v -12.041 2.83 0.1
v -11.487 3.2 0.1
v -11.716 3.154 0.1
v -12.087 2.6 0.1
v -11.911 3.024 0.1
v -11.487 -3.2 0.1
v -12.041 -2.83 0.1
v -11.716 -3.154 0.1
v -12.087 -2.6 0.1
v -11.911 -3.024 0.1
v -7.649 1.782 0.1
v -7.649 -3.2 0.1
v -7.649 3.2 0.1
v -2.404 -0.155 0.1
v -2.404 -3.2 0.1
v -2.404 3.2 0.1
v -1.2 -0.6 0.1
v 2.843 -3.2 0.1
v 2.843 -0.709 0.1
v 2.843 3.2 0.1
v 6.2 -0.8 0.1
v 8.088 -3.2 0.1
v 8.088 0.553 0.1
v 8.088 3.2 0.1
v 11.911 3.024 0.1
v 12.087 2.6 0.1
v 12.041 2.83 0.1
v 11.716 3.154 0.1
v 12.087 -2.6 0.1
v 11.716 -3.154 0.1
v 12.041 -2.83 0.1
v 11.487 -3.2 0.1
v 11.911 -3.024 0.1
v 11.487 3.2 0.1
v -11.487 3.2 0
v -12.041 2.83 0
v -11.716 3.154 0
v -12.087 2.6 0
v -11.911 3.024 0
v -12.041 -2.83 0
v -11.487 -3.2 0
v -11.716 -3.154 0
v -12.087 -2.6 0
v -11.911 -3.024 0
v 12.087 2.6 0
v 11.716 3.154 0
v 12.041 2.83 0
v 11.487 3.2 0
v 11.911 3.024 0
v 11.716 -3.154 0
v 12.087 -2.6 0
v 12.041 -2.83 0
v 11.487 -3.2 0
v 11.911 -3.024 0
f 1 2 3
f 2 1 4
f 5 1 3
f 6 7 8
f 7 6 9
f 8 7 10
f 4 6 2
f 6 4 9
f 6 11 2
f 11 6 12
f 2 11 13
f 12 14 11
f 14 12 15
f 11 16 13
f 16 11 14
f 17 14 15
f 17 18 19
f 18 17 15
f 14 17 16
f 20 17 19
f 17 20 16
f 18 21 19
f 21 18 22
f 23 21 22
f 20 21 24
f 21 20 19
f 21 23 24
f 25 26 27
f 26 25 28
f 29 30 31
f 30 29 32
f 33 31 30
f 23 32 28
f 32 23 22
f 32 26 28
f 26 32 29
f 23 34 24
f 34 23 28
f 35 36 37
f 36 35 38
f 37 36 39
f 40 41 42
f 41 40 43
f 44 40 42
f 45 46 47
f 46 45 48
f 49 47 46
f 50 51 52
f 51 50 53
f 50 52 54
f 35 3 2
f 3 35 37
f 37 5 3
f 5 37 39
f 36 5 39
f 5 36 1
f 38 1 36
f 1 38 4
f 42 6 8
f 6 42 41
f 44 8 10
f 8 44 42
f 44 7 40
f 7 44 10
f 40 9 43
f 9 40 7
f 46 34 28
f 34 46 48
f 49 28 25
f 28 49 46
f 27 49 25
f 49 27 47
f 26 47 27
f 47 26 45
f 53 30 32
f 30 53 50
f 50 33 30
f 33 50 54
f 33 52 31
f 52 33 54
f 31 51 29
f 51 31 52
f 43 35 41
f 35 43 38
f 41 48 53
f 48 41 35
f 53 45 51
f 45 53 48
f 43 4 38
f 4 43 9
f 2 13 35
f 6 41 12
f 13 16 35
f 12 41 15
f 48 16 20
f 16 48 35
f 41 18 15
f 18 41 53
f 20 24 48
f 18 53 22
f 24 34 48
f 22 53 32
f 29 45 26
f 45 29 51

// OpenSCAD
// file: ../p/empty.scad
use <../lib.scad>
function ldraw_lib__empty() = [
// 0 Empty
// 0 Name: empty.dat
// 0 Author: Steffen [Steffen]
// 0 !LDRAW_ORG Primitive UPDATE 2015-01
// 0 !LICENSE Licensed under CC BY 4.0 : see CAreadme.txt
// 
// 0 BFC CERTIFY CCW
  [0,"BFC","CERTIFY"],
  [0,"BFC","CCW"],
// 
// 0 !HISTORY 2015-10-11 [PTadmin] Official Update 2015-01
// 
// 
// 0 // Tool MLCad cannot handle really empty files. This file is used as a workaround.
// 0 // It exceptionally contains forbidden non-LDRAW standard syntax to satisfy MLCad until it is fixed OR a different editor has become the de-facto LDRAW standard.
// 0 // The line being used here is an "impossible" conditional line which never should be visible,
// 0 // additionally hidden by a syntax explicitly hiding it from displaying.
// 
// 0 MLCAD HIDE 5 24 0 0 0 0.0001 0 0 0.0001 -0.0001 0 0 0 0
];
module ldraw_lib__empty(step=0, col=false, unit=2/5, alt=false, line=0.2, solid=!$preview)
    makepoly(ldraw_lib__empty(), step=step, col=col, unit=unit, alt=alt, line=line, solid=solid);
ldraw_lib__empty(line=0.2);
// file: ../p/1-4cyli.scad
use <../lib.scad>
function ldraw_lib__1_4cyli() = [
// 0 Cylinder 0.25
// 0 Name: 1-4cyli.dat
// 0 Author: James Jessiman
// 0 !LDRAW_ORG Primitive UPDATE 2012-01
// 0 !LICENSE Licensed under CC BY 4.0 : see CAreadme.txt
// 
// 0 BFC CERTIFY CCW
  [0,"BFC","CERTIFY"],
  [0,"BFC","CCW"],
// 
// 0 !HISTORY 2002-03-23 [sbliss] Added BFC statement.
// 0 !HISTORY 2002-04-25 [PTadmin] Official Update 2002-02
// 0 !HISTORY 2007-06-22 [PTadmin] Header formatted for Contributor Agreement
// 0 !HISTORY 2008-07-01 [PTadmin] Official Update 2008-01
// 0 !HISTORY 2012-02-16 [Philo] Changed to CCW
// 0 !HISTORY 2012-03-30 [PTadmin] Official Update 2012-01
// 
// 
// 4 16 1 1 0 0.9239 1 0.3827 0.9239 0 0.3827 1 0 0
  [4,16,1,1,0,0.9239,1,0.3827,0.9239,0,0.3827,1,0,0],
// 5 24 1 0 0 1 1 0 0.9239 0 0.3827 1 0 -1
  [5,24,1,0,0,1,1,0,0.9239,0,0.3827,1,0,-1],
// 4 16 0.9239 1 0.3827 0.7071 1 0.7071 0.7071 0 0.7071 0.9239 0 0.3827
  [4,16,0.9239,1,0.3827,0.7071,1,0.7071,0.7071,0,0.7071,0.9239,0,0.3827],
// 5 24 0.9239 0 0.3827 0.9239 1 0.3827 0.7071 0 0.7071 1 0 0
  [5,24,0.9239,0,0.3827,0.9239,1,0.3827,0.7071,0,0.7071,1,0,0],
// 4 16 0.7071 1 0.7071 0.3827 1 0.9239 0.3827 0 0.9239 0.7071 0 0.7071
  [4,16,0.7071,1,0.7071,0.3827,1,0.9239,0.3827,0,0.9239,0.7071,0,0.7071],
// 5 24 0.7071 0 0.7071 0.7071 1 0.7071 0.3827 0 0.9239 0.9239 0 0.3827
  [5,24,0.7071,0,0.7071,0.7071,1,0.7071,0.3827,0,0.9239,0.9239,0,0.3827],
// 4 16 0.3827 1 0.9239 0 1 1 0 0 1 0.3827 0 0.9239
  [4,16,0.3827,1,0.9239,0,1,1,0,0,1,0.3827,0,0.9239],
// 5 24 0.3827 0 0.9239 0.3827 1 0.9239 0 0 1 0.7071 0 0.7071
  [5,24,0.3827,0,0.9239,0.3827,1,0.9239,0,0,1,0.7071,0,0.7071],
// 5 24 0 0 1 0 1 1 0.3827 0 0.9239 -1 0 1
  [5,24,0,0,1,0,1,1,0.3827,0,0.9239,-1,0,1],
];
module ldraw_lib__1_4cyli(step=0, col=false, unit=2/5, alt=false, line=0.2, solid=!$preview)
    makepoly(ldraw_lib__1_4cyli(), step=step, col=col, unit=unit, alt=alt, line=line, solid=solid);
ldraw_lib__1_4cyli(line=0.2);
// file: ../p/3-16chrd.scad
use <../lib.scad>
function ldraw_lib__3_16chrd() = [
// 0 Chord 0.1875
// 0 Name: 3-16chrd.dat
// 0 Author: Niels Karsdorp [nielsk]
// 0 !LDRAW_ORG Primitive UPDATE 2009-01
// 0 !LICENSE Licensed under CC BY 4.0 : see CAreadme.txt
// 
// 0 BFC CERTIFY CCW
  [0,"BFC","CERTIFY"],
  [0,"BFC","CCW"],
// 
// 0 !HISTORY 2009-05-02 [PTadmin] Official Update 2009-01
// 
// 
// 4 16 1 0 0 0.9239 0 0.3827 0.7071 0 0.7071 0.3827 0 0.9239
  [4,16,1,0,0,0.9239,0,0.3827,0.7071,0,0.7071,0.3827,0,0.9239],
// 0
// 
];
module ldraw_lib__3_16chrd(step=0, col=false, unit=2/5, alt=false, line=0.2, solid=!$preview)
    makepoly(ldraw_lib__3_16chrd(), step=step, col=col, unit=unit, alt=alt, line=line, solid=solid);
ldraw_lib__3_16chrd(line=0.2);
// file: ../p/1-16chrd.scad
use <../lib.scad>
use <empty.scad>
function ldraw_lib__1_16chrd() = [
// 0 Chord 0.0625
// 0 Name: 1-16chrd.dat
// 0 Author: Philippe Hurbain [Philo]
// 0 !LDRAW_ORG Primitive UPDATE 2015-01
// 0 !LICENSE Licensed under CC BY 4.0 : see CAreadme.txt
// 
// 0 BFC CERTIFY CCW
  [0,"BFC","CERTIFY"],
  [0,"BFC","CCW"],
// 
// 0 !HISTORY 2015-10-11 [PTadmin] Official Update 2015-01
// 
// 
// 0 // This file is intentionally empty because at the current \P resolution,
// 0 // an 1-16chrd is actually empty. However, this file still is present
// 0 // to allow tools to do primitives substition and fill in a real chrd here,
// 0 // or, if desired, to substitute this with the hi-res 48\1-16chrd.
// 
// 0 // This file is based on an idea by Darats at http://forums.ldraw.org/read.php?19,14500,14500#msg-14500
// 
// 1 16 0 0 0 1 0 0 0 1 0 0 0 1 empty.dat
  [1,16,0,0,0,1,0,0,0,1,0,0,0,1, ldraw_lib__empty()],
];
module ldraw_lib__1_16chrd(step=0, col=false, unit=2/5, alt=false, line=0.2, solid=!$preview)
    makepoly(ldraw_lib__1_16chrd(), step=step, col=col, unit=unit, alt=alt, line=line, solid=solid);
ldraw_lib__1_16chrd(line=0.2);
// file: ../p/1-4chrd.scad
use <../lib.scad>
function ldraw_lib__1_4chrd() = [
// 0 Chord 0.25
// 0 Name: 1-4chrd.dat
// 0 Author: Max Martin Richter [MMR1988]
// 0 !LDRAW_ORG Primitive UPDATE 2023-05
// 0 !LICENSE Licensed under CC BY 4.0 : see CAreadme.txt
// 
// 0 BFC CERTIFY CCW
  [0,"BFC","CERTIFY"],
  [0,"BFC","CCW"],
// 
// 0 !HISTORY 2004-04-22 [PTadmin] Official Update 2004-02
// 0 !HISTORY 2007-10-09 [PTadmin] Header formatted for Contributor Agreement
// 0 !HISTORY 2008-07-01 [PTadmin] Official Update 2008-01
// 0 !HISTORY 2012-08-02 [MMR1988] Re-creation with PrimGen2 and Rectifier
// 0 !HISTORY 2012-08-09 [PTadmin] Official Update 2012-02
// 0 !HISTORY 2023-10-27 [OrionP] Change author to MMR1988 from hafhead
// 0 !HISTORY 2023-10-31 [OrionP] Official Update 2023-05
// 
// 4 16 0.9239 0 0.3827 0.3827 0 0.9239 0 0 1 1 0 0
  [4,16,0.9239,0,0.3827,0.3827,0,0.9239,0,0,1,1,0,0],
// 3 16 0.7071 0 0.7071 0.3827 0 0.9239 0.9239 0 0.3827
  [3,16,0.7071,0,0.7071,0.3827,0,0.9239,0.9239,0,0.3827],
];
module ldraw_lib__1_4chrd(step=0, col=false, unit=2/5, alt=false, line=0.2, solid=!$preview)
    makepoly(ldraw_lib__1_4chrd(), step=step, col=col, unit=unit, alt=alt, line=line, solid=solid);
ldraw_lib__1_4chrd(line=0.2);
// file: s/6142275ws06.scad
use <../../lib.scad>
use <../../p/1-4chrd.scad>
use <../../p/1-4cyli.scad>
function ldraw_lib__s__6142275ws06() = [
// 0 ~Sticker  0.8 x  3.1 with White Trapezoid on Grey Background Left - Bottom Face
// 0 Name: s\6142275ws06.dat
// 0 Author: Massimo Maso [Sirio]
// 0 !LDRAW_ORG Subpart UPDATE 2023-06
// 0 !LICENSE Licensed under CC BY 4.0 : see CAreadme.txt
// 
// 0 BFC CERTIFY CCW
  [0,"BFC","CERTIFY"],
  [0,"BFC","CCW"],
// 
// 0 !HISTORY 2023-11-19 [OrionP] Official Update 2023-06
// 
// 
// 0 // Primitives
// 1 16 -6.5 0 28.7171 -1.5 0 0 0 -1 0 0 0 1.5 1-4chrd.dat
  [1,16,-6.5,0,28.7171,-1.5,0,0,0,-1,0,0,0,1.5, ldraw_lib__1_4chrd()],
// 1 16 6.5 0 28.7171 1.5 0 0 0 -1 0 0 0 1.5 1-4chrd.dat
  [1,16,6.5,0,28.7171,1.5,0,0,0,-1,0,0,0,1.5, ldraw_lib__1_4chrd()],
// 1 16 -6.5 0 -28.7171 -1.5 0 0 0 -1 0 0 0 -1.5 1-4chrd.dat
  [1,16,-6.5,0,-28.7171,-1.5,0,0,0,-1,0,0,0,-1.5, ldraw_lib__1_4chrd()],
// 1 16 6.5 0 -28.7171 1.5 0 0 0 -1 0 0 0 -1.5 1-4chrd.dat
  [1,16,6.5,0,-28.7171,1.5,0,0,0,-1,0,0,0,-1.5, ldraw_lib__1_4chrd()],
// 1 16 -6.5 -0.25 28.7171 -1.5 0 0 0 0.25 0 0 0 1.5 1-4cyli.dat
  [1,16,-6.5,-0.25,28.7171,-1.5,0,0,0,0.25,0,0,0,1.5, ldraw_lib__1_4cyli()],
// 1 16 6.5 -0.25 28.7171 1.5 0 0 0 0.25 0 0 0 1.5 1-4cyli.dat
  [1,16,6.5,-0.25,28.7171,1.5,0,0,0,0.25,0,0,0,1.5, ldraw_lib__1_4cyli()],
// 1 16 -6.5 -0.25 -28.7171 -1.5 0 0 0 0.25 0 0 0 -1.5 1-4cyli.dat
  [1,16,-6.5,-0.25,-28.7171,-1.5,0,0,0,0.25,0,0,0,-1.5, ldraw_lib__1_4cyli()],
// 1 16 6.5 -0.25 -28.7171 1.5 0 0 0 0.25 0 0 0 -1.5 1-4cyli.dat
  [1,16,6.5,-0.25,-28.7171,1.5,0,0,0,0.25,0,0,0,-1.5, ldraw_lib__1_4cyli()],
// 0 // Bottom face
// 4 16 6.5 0 30.2171 8 0 28.7171 -8 0 28.7171 -6.5 0 30.2171
  [4,16,6.5,0,30.2171,8,0,28.7171,-8,0,28.7171,-6.5,0,30.2171],
// 4 16 8 0 28.7171 8 0 -28.7171 -8 0 -28.7171 -8 0 28.7171
  [4,16,8,0,28.7171,8,0,-28.7171,-8,0,-28.7171,-8,0,28.7171],
// 4 16 6.5 0 -30.2171 -6.5 0 -30.2171 -8 0 -28.7171 8 0 -28.7171
  [4,16,6.5,0,-30.2171,-6.5,0,-30.2171,-8,0,-28.7171,8,0,-28.7171],
// 0 // Lateral face
// 4 16 -6.5 0 30.2171 -6.5 -.25 30.2171 6.5 -.25 30.2171 6.5 0 30.2171
  [4,16,-6.5,0,30.2171,-6.5,-.25,30.2171,6.5,-.25,30.2171,6.5,0,30.2171],
// 3 16 -8 0 28.7171 -8 -.25 19.1225 -8 -.25 28.7171
  [3,16,-8,0,28.7171,-8,-.25,19.1225,-8,-.25,28.7171],
// 3 16 8 -.25 19.1225 8 0 28.7171 8 -.25 28.7171
  [3,16,8,-.25,19.1225,8,0,28.7171,8,-.25,28.7171],
// 3 16 -8 0 28.7171 -8 -.25 6.0088 -8 -.25 19.1225
  [3,16,-8,0,28.7171,-8,-.25,6.0088,-8,-.25,19.1225],
// 3 16 8 -.25 6.0088 8 0 28.7171 8 -.25 19.1225
  [3,16,8,-.25,6.0088,8,0,28.7171,8,-.25,19.1225],
// 4 16 -8 0 28.7171 -8 0 -28.7171 -8 -.25 -7.1065 -8 -.25 6.0088
  [4,16,-8,0,28.7171,-8,0,-28.7171,-8,-.25,-7.1065,-8,-.25,6.0088],
// 4 16 8 -.25 -7.1065 8 0 -28.7171 8 0 28.7171 8 -.25 6.0088
  [4,16,8,-.25,-7.1065,8,0,-28.7171,8,0,28.7171,8,-.25,6.0088],
// 3 16 -8 0 -28.7171 -8 -.25 -20.2198 -8 -.25 -7.1065
  [3,16,-8,0,-28.7171,-8,-.25,-20.2198,-8,-.25,-7.1065],
// 3 16 8 -.25 -20.2198 8 0 -28.7171 8 -.25 -7.1065
  [3,16,8,-.25,-20.2198,8,0,-28.7171,8,-.25,-7.1065],
// 3 16 -8 0 -28.7171 -8 -.25 -28.7171 -8 -.25 -20.2198
  [3,16,-8,0,-28.7171,-8,-.25,-28.7171,-8,-.25,-20.2198],
// 3 16 8 -.25 -28.7171 8 0 -28.7171 8 -.25 -20.2198
  [3,16,8,-.25,-28.7171,8,0,-28.7171,8,-.25,-20.2198],
// 4 16 -6.5 0 -30.2171 6.5 0 -30.2171 6.5 -.25 -30.2171 -6.5 -.25 -30.2171
  [4,16,-6.5,0,-30.2171,6.5,0,-30.2171,6.5,-.25,-30.2171,-6.5,-.25,-30.2171],
];
module ldraw_lib__s__6142275ws06(step=0, col=false, unit=2/5, alt=false, line=0.2, solid=!$preview)
    makepoly(ldraw_lib__s__6142275ws06(), step=step, col=col, unit=unit, alt=alt, line=line, solid=solid);
ldraw_lib__s__6142275ws06(line=0.2);
// file: s/6142275ws05.scad
use <../../lib.scad>
use <../../p/1-16chrd.scad>
use <../../p/1-4chrd.scad>
use <../../p/3-16chrd.scad>
function ldraw_lib__s__6142275ws05() = [
// 0 ~Sticker  0.8 x  3.1 with White Trapezoid on Grey Background Left - Fifth Face
// 0 Name: s\6142275ws05.dat
// 0 Author: Massimo Maso [Sirio]
// 0 !LDRAW_ORG Subpart UPDATE 2023-06
// 0 !LICENSE Licensed under CC BY 4.0 : see CAreadme.txt
// 
// 0 BFC CERTIFY CCW
  [0,"BFC","CERTIFY"],
  [0,"BFC","CCW"],
// 
// 0 !HISTORY 2023-11-19 [OrionP] Official Update 2023-06
// 
// 
// 0 // Primitives
// 1 15 -6.5 -.25 -8.4817 -1.5 0 0 0 1 0 0 0 -1.5 1-16chrd.dat
  [1,15,-6.5,-.25,-8.4817,-1.5,0,0,0,1,0,0,0,-1.5, ldraw_lib__1_16chrd()],
// 1 72 -6.5 -.25 -8.4817 0 0 -1.5 0 1 0 -1.5 0 0 3-16chrd.dat
  [1,72,-6.5,-.25,-8.4817,0,0,-1.5,0,1,0,-1.5,0,0, ldraw_lib__3_16chrd()],
// 1 72 6.5 -.25 -8.4817 1.5 0 0 0 1 0 0 0 -1.5 1-4chrd.dat
  [1,72,6.5,-.25,-8.4817,1.5,0,0,0,1,0,0,0,-1.5, ldraw_lib__1_4chrd()],
// 0 // Grey faces
// 4 72 -7.88585 -.25 -9.05575 8 -.25 -8.4817 8 -.25 .0156 -1.3833 -.25 .0156
  [4,72,-7.88585,-.25,-9.05575,8,-.25,-8.4817,8,-.25,.0156,-1.3833,-.25,.0156],
// 4 72 -7.88585 -.25 -9.05575 -6.5 -.25 -9.9817 6.5 -.25 -9.9817 8 -.25 -8.4817
  [4,72,-7.88585,-.25,-9.05575,-6.5,-.25,-9.9817,6.5,-.25,-9.9817,8,-.25,-8.4817],
// 0 // White face
// 4 15 -7.88585 -.25 -9.05575 -1.3833 -.25 .0156 -8 -.25 .0156 -8 -.25 -8.4817
  [4,15,-7.88585,-.25,-9.05575,-1.3833,-.25,.0156,-8,-.25,.0156,-8,-.25,-8.4817],
];
module ldraw_lib__s__6142275ws05(step=0, col=false, unit=2/5, alt=false, line=0.2, solid=!$preview)
    makepoly(ldraw_lib__s__6142275ws05(), step=step, col=col, unit=unit, alt=alt, line=line, solid=solid);
ldraw_lib__s__6142275ws05(line=0.2);
// file: s/6142275ws04.scad
use <../../lib.scad>
function ldraw_lib__s__6142275ws04() = [
// 0 ~Sticker  0.8 x  3.1 with White Trapezoid on Grey Background Left - Fourth Face
// 0 Name: s\6142275ws04.dat
// 0 Author: Massimo Maso [Sirio]
// 0 !LDRAW_ORG Subpart UPDATE 2023-06
// 0 !LICENSE Licensed under CC BY 4.0 : see CAreadme.txt
// 
// 0 BFC CERTIFY CCW
  [0,"BFC","CERTIFY"],
  [0,"BFC","CCW"],
// 
// 0 !HISTORY 2023-11-19 [OrionP] Official Update 2023-06
// 
// 
// 0 // Grey faces
// 4 72 8 -.25 -.0156 8 -.25 13.0977 1.7731 -.25 13.0977 2 -.25 4.7042
  [4,72,8,-.25,-.0156,8,-.25,13.0977,1.7731,-.25,13.0977,2,-.25,4.7042],
// 3 72 8 -.25 -.0156 2 -.25 4.7042 -1.3833 -.25 -.0156
  [3,72,8,-.25,-.0156,2,-.25,4.7042,-1.3833,-.25,-.0156],
// 0 // White faces
// 4 15 -8 -.25 -.0156 2 -.25 4.7042 1.7731 -.25 13.0977 -8 -.25 13.0977
  [4,15,-8,-.25,-.0156,2,-.25,4.7042,1.7731,-.25,13.0977,-8,-.25,13.0977],
// 3 15 -8 -.25 -.0156 -1.3833 -.25 -.0156 2 -.25 4.7042
  [3,15,-8,-.25,-.0156,-1.3833,-.25,-.0156,2,-.25,4.7042],
];
module ldraw_lib__s__6142275ws04(step=0, col=false, unit=2/5, alt=false, line=0.2, solid=!$preview)
    makepoly(ldraw_lib__s__6142275ws04(), step=step, col=col, unit=unit, alt=alt, line=line, solid=solid);
ldraw_lib__s__6142275ws04(line=0.2);
// file: s/6142275ws03.scad
use <../../lib.scad>
function ldraw_lib__s__6142275ws03() = [
// 0 ~Sticker  0.8 x  3.1 with White Trapezoid on Grey Background Left - Third Face
// 0 Name: s\6142275ws03.dat
// 0 Author: Massimo Maso [Sirio]
// 0 !LDRAW_ORG Subpart UPDATE 2023-06
// 0 !LICENSE Licensed under CC BY 4.0 : see CAreadme.txt
// 
// 0 BFC CERTIFY CCW
  [0,"BFC","CERTIFY"],
  [0,"BFC","CCW"],
// 
// 0 !HISTORY 2023-11-19 [OrionP] Official Update 2023-06
// 
// 
// 0 // Grey facess
// 3 72 8 -.25 13.0988 .3885 -.25 13.0988 1.5 -.25 10.09
  [3,72,8,-.25,13.0988,.3885,-.25,13.0988,1.5,-.25,10.09],
// 4 72 8 -.25 13.0988 1.5 -.25 10.09 1.7731 -.25 -.0165 8 -.25 -.0165
  [4,72,8,-.25,13.0988,1.5,-.25,10.09,1.7731,-.25,-.0165,8,-.25,-.0165],
// 0 // White faces
// 3 15 -8 -.25 13.0988 1.5 -.25 10.09 .3885 -.25 13.0988
  [3,15,-8,-.25,13.0988,1.5,-.25,10.09,.3885,-.25,13.0988],
// 4 15 -8 -.25 13.0988 -8 -.25 -.0165 1.7731 -.25 -.0165 1.5 -.25 10.09
  [4,15,-8,-.25,13.0988,-8,-.25,-.0165,1.7731,-.25,-.0165,1.5,-.25,10.09],
];
module ldraw_lib__s__6142275ws03(step=0, col=false, unit=2/5, alt=false, line=0.2, solid=!$preview)
    makepoly(ldraw_lib__s__6142275ws03(), step=step, col=col, unit=unit, alt=alt, line=line, solid=solid);
ldraw_lib__s__6142275ws03(line=0.2);
// file: s/6142275ws02.scad
use <../../lib.scad>
function ldraw_lib__s__6142275ws02() = [
// 0 ~Sticker  0.8 x  3.1 with White Trapezoid on Grey Background Left - Second Face
// 0 Name: s\6142275ws02.dat
// 0 Author: Massimo Maso [Sirio]
// 0 !LDRAW_ORG Subpart UPDATE 2023-06
// 0 !LICENSE Licensed under CC BY 4.0 : see CAreadme.txt
// 
// 0 BFC CERTIFY CCW
  [0,"BFC","CERTIFY"],
  [0,"BFC","CCW"],
// 
// 0 !HISTORY 2023-11-19 [OrionP] Official Update 2023-06
// 
// 
// 0 // Grey face
// 4 72 -4.4557 -.25 .0163 .3885 -.25 -13.0974 8 -.25 -13.0974 8 -.25 .0163
  [4,72,-4.4557,-.25,.0163,.3885,-.25,-13.0974,8,-.25,-13.0974,8,-.25,.0163],
// 0 // White face
// 4 15 -8 -.25 .0163 -8 -.25 -13.0974 .3885 -.25 -13.0974 -4.4557 -.25 .0163
  [4,15,-8,-.25,.0163,-8,-.25,-13.0974,.3885,-.25,-13.0974,-4.4557,-.25,.0163],
];
module ldraw_lib__s__6142275ws02(step=0, col=false, unit=2/5, alt=false, line=0.2, solid=!$preview)
    makepoly(ldraw_lib__s__6142275ws02(), step=step, col=col, unit=unit, alt=alt, line=line, solid=solid);
ldraw_lib__s__6142275ws02(line=0.2);
// file: s/6142275ws01.scad
use <../../lib.scad>
use <../../p/1-4chrd.scad>
function ldraw_lib__s__6142275ws01() = [
// 0 ~Sticker  0.8 x  3.1 with White Trapezoid on Grey Background Left - First Face
// 0 Name: s\6142275ws01.dat
// 0 Author: Massimo Maso [Sirio]
// 0 !LDRAW_ORG Subpart UPDATE 2023-06
// 0 !LICENSE Licensed under CC BY 4.0 : see CAreadme.txt
// 
// 0 BFC CERTIFY CCW
  [0,"BFC","CERTIFY"],
  [0,"BFC","CCW"],
// 
// 0 !HISTORY 2023-11-19 [OrionP] Official Update 2023-06
// 
// 
// 0 // Primitives
// 1 72 -6.5 -.25 9.5783 -1.5 0 0 0 1 0 0 0 1.5 1-4chrd.dat
  [1,72,-6.5,-.25,9.5783,-1.5,0,0,0,1,0,0,0,1.5, ldraw_lib__1_4chrd()],
// 1 72 6.5 -.25 9.5783 1.5 0 0 0 1 0 0 0 1.5 1-4chrd.dat
  [1,72,6.5,-.25,9.5783,1.5,0,0,0,1,0,0,0,1.5, ldraw_lib__1_4chrd()],
// 0 // Grey faces
// 4 72 -6.5 -.25 11.0783 -8 -.25 9.5783 8 -.25 9.5783 6.5 -.25 11.0783
  [4,72,-6.5,-.25,11.0783,-8,-.25,9.5783,8,-.25,9.5783,6.5,-.25,11.0783],
// 4 72 -8 -.25 9.5783 -4.4557 -.25 -.0163 8 -.25 -.0163 8 -.25 9.5783
  [4,72,-8,-.25,9.5783,-4.4557,-.25,-.0163,8,-.25,-.0163,8,-.25,9.5783],
// 0 // White face
// 3 15 -8 -.25 -.0163 -4.4557 -.25 -.0163 -8 -.25 9.5783
  [3,15,-8,-.25,-.0163,-4.4557,-.25,-.0163,-8,-.25,9.5783],
];
module ldraw_lib__s__6142275ws01(step=0, col=false, unit=2/5, alt=false, line=0.2, solid=!$preview)
    makepoly(ldraw_lib__s__6142275ws01(), step=step, col=col, unit=unit, alt=alt, line=line, solid=solid);
ldraw_lib__s__6142275ws01(line=0.2);
// file: 6142275w.scad
use <../lib.scad>
use <s/6142275ws01.scad>
use <s/6142275ws02.scad>
use <s/6142275ws03.scad>
use <s/6142275ws04.scad>
use <s/6142275ws05.scad>
use <s/6142275ws06.scad>
function ldraw_lib__6142275w() = [
// 0 Sticker  0.8 x  3.1 with White Trapezoid on Grey Background Left
// 0 Name: 6142275w.dat
// 0 Author: Massimo Maso [Sirio]
// 0 !LDRAW_ORG Part UPDATE 2023-06
// 0 !LICENSE Licensed under CC BY 4.0 : see CAreadme.txt
// 
// 0 BFC CERTIFY CCW
  [0,"BFC","CERTIFY"],
  [0,"BFC","CCW"],
// 
// 0 !KEYWORDS Audi, e-tron, quattro, R18, Set 75872, Speed Champions
// 
// 0 !HISTORY 2023-11-19 [OrionP] Official Update 2023-06
// 
// 
// 1 16 19.1388 0 0 0 0 1 0 1 0 -1 0 0 s\6142275ws01.dat
  [1,16,19.1388,0,0,0,0,1,0,1,0,-1,0,0, ldraw_lib__s__6142275ws01()],
// 1 16 19.1062 0 0 0 0 1 0 1 0 -1 0 0 s\6142275ws02.dat
  [1,16,19.1062,0,0,0,0,1,0,1,0,-1,0,0, ldraw_lib__s__6142275ws02()],
// 1 16 -7.09 0 0 0 0 1 0 1 0 -1 0 0 s\6142275ws03.dat
  [1,16,-7.09,0,0,0,0,1,0,1,0,-1,0,0, ldraw_lib__s__6142275ws03()],
// 1 16 -20.2042 0 0 0 0 1 0 1 0 -1 0 0 s\6142275ws04.dat
  [1,16,-20.2042,0,0,0,0,1,0,1,0,-1,0,0, ldraw_lib__s__6142275ws04()],
// 1 16 -20.2354 0 0 0 0 1 0 1 0 -1 0 0 s\6142275ws05.dat
  [1,16,-20.2354,0,0,0,0,1,0,1,0,-1,0,0, ldraw_lib__s__6142275ws05()],
// 1 16 0 0 0 0 0 1 0 1 0 -1 0 0 s\6142275ws06.dat
  [1,16,0,0,0,0,0,1,0,1,0,-1,0,0, ldraw_lib__s__6142275ws06()],
];
module ldraw_lib__6142275w(step=0, col=false, unit=2/5, alt=false, line=0.2, solid=!$preview)
    makepoly(ldraw_lib__6142275w(), step=step, col=col, unit=unit, alt=alt, line=line, solid=solid);
ldraw_lib__6142275w(line=0.2);
// main file
use <../lib.scad>
use <6142275w.scad>
function ldraw_lib__6142275x() = [
// 0 Sticker  0.8 x  3.1 with White Trapezoid on Grey Background Right
// 0 Name: 6142275x.dat
// 0 Author: Massimo Maso [Sirio]
// 0 !LDRAW_ORG Part UPDATE 2023-06
// 0 !LICENSE Licensed under CC BY 4.0 : see CAreadme.txt
// 
// 0 BFC CERTIFY CCW
  [0,"BFC","CERTIFY"],
  [0,"BFC","CCW"],
// 
// 0 !KEYWORDS Audi, e-tron, quattro, R18, Set 75872, Speed Champions
// 
// 0 !HISTORY 2023-11-19 [OrionP] Official Update 2023-06
// 
// 
// 1 16 0 0 0 -1 0 0 0 1 0 0 0 1 6142275w.dat
  [1,16,0,0,0,-1,0,0,0,1,0,0,0,1, ldraw_lib__6142275w()],
];
module ldraw_lib__6142275x(step=0, col=false, unit=2/5, alt=false, line=0.2, solid=!$preview)
    makepoly(ldraw_lib__6142275x(), step=step, col=col, unit=unit, alt=alt, line=line, solid=solid);
ldraw_lib__6142275x(line=0.2);
